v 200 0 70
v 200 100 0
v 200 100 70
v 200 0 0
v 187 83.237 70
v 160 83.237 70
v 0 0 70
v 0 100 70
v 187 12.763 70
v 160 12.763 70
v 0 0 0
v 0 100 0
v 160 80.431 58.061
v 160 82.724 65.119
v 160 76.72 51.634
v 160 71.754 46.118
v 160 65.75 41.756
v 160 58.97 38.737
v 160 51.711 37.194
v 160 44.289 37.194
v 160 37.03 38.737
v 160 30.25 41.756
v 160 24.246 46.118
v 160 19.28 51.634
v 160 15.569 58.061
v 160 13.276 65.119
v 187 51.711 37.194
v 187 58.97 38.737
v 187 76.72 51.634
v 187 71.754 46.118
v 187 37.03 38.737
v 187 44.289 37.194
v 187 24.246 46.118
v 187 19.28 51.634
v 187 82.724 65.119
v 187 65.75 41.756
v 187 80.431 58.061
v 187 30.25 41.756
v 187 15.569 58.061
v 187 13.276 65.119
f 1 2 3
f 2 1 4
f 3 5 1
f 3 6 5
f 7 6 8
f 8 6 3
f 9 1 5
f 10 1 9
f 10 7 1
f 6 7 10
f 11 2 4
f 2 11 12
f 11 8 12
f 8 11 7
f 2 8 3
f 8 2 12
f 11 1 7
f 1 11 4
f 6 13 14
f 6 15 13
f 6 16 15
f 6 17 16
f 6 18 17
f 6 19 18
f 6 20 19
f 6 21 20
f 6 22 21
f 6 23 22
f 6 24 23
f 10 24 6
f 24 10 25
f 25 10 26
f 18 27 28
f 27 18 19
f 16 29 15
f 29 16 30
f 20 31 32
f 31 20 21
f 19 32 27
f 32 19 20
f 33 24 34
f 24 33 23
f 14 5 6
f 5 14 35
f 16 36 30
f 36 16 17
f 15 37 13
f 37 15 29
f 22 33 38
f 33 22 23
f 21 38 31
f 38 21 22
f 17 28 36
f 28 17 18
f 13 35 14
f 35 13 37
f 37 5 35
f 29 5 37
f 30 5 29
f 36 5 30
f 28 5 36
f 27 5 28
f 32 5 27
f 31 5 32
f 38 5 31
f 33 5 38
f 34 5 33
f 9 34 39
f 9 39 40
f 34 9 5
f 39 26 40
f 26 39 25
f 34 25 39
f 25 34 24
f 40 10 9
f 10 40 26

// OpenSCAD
/* Santa Cruz Shredder
Large 2 piece grinder 2.75"
69mm diamter x 26mm height
*/ 

grinder_radius = 34.5;
grinder_height = 26;
grinder_padding = 1;

tray_width = 200;
tray_height = 100;
tray_depth = 70;

module grinder_with_padding() {
    rotate([90, 0, 90])
    translate([(tray_depth/2) + (grinder_height/2), tray_height - (grinder_radius-7),160])
    cylinder(r1=grinder_radius+grinder_padding, r2=grinder_radius+grinder_padding, h=grinder_height+grinder_padding);
};

module tray_base() {
    cube([tray_width, tray_height, tray_depth]);
}


module brush_with_padding() {
    //cylinder & sphere hole
}


difference() {
  tray_base();
  grinder_with_padding();
}


//(ashtray/masonjar/
//

/* Volcano cleaning brush
https://www.volcanovaporizer.com/us/en/cleaning-brush-set.html
7mm diameter x 90mm full height
*/
// create an object of the size
// cut it out from the tray block


/* Volcano Easy Valve Filling Chamber
https://www.volcanovaporizer.com/us/en/store/easy-valve-filling-chamber-for-herbs.html
42mm diameter x 63mm height
*/



/* TightVac Herb Container
1 oz to 6 ounce Airtight Multi-Use Vacuum Seal Portable Storage Container for Dry Goods, Food, and Herbs - Black Cap & Body
https://www.amazon.com/gp/product/B0049557HI/ref=oh_aui_search_detailpage?ie=UTF8&psc=1
84mm diameter x 143mm height
*/



// weed holding chamber (drawer?)(and cover)

// weed scoop the exact size of volcano bowl

// space for extra screens, gaskets, clips, bags (drawers?
